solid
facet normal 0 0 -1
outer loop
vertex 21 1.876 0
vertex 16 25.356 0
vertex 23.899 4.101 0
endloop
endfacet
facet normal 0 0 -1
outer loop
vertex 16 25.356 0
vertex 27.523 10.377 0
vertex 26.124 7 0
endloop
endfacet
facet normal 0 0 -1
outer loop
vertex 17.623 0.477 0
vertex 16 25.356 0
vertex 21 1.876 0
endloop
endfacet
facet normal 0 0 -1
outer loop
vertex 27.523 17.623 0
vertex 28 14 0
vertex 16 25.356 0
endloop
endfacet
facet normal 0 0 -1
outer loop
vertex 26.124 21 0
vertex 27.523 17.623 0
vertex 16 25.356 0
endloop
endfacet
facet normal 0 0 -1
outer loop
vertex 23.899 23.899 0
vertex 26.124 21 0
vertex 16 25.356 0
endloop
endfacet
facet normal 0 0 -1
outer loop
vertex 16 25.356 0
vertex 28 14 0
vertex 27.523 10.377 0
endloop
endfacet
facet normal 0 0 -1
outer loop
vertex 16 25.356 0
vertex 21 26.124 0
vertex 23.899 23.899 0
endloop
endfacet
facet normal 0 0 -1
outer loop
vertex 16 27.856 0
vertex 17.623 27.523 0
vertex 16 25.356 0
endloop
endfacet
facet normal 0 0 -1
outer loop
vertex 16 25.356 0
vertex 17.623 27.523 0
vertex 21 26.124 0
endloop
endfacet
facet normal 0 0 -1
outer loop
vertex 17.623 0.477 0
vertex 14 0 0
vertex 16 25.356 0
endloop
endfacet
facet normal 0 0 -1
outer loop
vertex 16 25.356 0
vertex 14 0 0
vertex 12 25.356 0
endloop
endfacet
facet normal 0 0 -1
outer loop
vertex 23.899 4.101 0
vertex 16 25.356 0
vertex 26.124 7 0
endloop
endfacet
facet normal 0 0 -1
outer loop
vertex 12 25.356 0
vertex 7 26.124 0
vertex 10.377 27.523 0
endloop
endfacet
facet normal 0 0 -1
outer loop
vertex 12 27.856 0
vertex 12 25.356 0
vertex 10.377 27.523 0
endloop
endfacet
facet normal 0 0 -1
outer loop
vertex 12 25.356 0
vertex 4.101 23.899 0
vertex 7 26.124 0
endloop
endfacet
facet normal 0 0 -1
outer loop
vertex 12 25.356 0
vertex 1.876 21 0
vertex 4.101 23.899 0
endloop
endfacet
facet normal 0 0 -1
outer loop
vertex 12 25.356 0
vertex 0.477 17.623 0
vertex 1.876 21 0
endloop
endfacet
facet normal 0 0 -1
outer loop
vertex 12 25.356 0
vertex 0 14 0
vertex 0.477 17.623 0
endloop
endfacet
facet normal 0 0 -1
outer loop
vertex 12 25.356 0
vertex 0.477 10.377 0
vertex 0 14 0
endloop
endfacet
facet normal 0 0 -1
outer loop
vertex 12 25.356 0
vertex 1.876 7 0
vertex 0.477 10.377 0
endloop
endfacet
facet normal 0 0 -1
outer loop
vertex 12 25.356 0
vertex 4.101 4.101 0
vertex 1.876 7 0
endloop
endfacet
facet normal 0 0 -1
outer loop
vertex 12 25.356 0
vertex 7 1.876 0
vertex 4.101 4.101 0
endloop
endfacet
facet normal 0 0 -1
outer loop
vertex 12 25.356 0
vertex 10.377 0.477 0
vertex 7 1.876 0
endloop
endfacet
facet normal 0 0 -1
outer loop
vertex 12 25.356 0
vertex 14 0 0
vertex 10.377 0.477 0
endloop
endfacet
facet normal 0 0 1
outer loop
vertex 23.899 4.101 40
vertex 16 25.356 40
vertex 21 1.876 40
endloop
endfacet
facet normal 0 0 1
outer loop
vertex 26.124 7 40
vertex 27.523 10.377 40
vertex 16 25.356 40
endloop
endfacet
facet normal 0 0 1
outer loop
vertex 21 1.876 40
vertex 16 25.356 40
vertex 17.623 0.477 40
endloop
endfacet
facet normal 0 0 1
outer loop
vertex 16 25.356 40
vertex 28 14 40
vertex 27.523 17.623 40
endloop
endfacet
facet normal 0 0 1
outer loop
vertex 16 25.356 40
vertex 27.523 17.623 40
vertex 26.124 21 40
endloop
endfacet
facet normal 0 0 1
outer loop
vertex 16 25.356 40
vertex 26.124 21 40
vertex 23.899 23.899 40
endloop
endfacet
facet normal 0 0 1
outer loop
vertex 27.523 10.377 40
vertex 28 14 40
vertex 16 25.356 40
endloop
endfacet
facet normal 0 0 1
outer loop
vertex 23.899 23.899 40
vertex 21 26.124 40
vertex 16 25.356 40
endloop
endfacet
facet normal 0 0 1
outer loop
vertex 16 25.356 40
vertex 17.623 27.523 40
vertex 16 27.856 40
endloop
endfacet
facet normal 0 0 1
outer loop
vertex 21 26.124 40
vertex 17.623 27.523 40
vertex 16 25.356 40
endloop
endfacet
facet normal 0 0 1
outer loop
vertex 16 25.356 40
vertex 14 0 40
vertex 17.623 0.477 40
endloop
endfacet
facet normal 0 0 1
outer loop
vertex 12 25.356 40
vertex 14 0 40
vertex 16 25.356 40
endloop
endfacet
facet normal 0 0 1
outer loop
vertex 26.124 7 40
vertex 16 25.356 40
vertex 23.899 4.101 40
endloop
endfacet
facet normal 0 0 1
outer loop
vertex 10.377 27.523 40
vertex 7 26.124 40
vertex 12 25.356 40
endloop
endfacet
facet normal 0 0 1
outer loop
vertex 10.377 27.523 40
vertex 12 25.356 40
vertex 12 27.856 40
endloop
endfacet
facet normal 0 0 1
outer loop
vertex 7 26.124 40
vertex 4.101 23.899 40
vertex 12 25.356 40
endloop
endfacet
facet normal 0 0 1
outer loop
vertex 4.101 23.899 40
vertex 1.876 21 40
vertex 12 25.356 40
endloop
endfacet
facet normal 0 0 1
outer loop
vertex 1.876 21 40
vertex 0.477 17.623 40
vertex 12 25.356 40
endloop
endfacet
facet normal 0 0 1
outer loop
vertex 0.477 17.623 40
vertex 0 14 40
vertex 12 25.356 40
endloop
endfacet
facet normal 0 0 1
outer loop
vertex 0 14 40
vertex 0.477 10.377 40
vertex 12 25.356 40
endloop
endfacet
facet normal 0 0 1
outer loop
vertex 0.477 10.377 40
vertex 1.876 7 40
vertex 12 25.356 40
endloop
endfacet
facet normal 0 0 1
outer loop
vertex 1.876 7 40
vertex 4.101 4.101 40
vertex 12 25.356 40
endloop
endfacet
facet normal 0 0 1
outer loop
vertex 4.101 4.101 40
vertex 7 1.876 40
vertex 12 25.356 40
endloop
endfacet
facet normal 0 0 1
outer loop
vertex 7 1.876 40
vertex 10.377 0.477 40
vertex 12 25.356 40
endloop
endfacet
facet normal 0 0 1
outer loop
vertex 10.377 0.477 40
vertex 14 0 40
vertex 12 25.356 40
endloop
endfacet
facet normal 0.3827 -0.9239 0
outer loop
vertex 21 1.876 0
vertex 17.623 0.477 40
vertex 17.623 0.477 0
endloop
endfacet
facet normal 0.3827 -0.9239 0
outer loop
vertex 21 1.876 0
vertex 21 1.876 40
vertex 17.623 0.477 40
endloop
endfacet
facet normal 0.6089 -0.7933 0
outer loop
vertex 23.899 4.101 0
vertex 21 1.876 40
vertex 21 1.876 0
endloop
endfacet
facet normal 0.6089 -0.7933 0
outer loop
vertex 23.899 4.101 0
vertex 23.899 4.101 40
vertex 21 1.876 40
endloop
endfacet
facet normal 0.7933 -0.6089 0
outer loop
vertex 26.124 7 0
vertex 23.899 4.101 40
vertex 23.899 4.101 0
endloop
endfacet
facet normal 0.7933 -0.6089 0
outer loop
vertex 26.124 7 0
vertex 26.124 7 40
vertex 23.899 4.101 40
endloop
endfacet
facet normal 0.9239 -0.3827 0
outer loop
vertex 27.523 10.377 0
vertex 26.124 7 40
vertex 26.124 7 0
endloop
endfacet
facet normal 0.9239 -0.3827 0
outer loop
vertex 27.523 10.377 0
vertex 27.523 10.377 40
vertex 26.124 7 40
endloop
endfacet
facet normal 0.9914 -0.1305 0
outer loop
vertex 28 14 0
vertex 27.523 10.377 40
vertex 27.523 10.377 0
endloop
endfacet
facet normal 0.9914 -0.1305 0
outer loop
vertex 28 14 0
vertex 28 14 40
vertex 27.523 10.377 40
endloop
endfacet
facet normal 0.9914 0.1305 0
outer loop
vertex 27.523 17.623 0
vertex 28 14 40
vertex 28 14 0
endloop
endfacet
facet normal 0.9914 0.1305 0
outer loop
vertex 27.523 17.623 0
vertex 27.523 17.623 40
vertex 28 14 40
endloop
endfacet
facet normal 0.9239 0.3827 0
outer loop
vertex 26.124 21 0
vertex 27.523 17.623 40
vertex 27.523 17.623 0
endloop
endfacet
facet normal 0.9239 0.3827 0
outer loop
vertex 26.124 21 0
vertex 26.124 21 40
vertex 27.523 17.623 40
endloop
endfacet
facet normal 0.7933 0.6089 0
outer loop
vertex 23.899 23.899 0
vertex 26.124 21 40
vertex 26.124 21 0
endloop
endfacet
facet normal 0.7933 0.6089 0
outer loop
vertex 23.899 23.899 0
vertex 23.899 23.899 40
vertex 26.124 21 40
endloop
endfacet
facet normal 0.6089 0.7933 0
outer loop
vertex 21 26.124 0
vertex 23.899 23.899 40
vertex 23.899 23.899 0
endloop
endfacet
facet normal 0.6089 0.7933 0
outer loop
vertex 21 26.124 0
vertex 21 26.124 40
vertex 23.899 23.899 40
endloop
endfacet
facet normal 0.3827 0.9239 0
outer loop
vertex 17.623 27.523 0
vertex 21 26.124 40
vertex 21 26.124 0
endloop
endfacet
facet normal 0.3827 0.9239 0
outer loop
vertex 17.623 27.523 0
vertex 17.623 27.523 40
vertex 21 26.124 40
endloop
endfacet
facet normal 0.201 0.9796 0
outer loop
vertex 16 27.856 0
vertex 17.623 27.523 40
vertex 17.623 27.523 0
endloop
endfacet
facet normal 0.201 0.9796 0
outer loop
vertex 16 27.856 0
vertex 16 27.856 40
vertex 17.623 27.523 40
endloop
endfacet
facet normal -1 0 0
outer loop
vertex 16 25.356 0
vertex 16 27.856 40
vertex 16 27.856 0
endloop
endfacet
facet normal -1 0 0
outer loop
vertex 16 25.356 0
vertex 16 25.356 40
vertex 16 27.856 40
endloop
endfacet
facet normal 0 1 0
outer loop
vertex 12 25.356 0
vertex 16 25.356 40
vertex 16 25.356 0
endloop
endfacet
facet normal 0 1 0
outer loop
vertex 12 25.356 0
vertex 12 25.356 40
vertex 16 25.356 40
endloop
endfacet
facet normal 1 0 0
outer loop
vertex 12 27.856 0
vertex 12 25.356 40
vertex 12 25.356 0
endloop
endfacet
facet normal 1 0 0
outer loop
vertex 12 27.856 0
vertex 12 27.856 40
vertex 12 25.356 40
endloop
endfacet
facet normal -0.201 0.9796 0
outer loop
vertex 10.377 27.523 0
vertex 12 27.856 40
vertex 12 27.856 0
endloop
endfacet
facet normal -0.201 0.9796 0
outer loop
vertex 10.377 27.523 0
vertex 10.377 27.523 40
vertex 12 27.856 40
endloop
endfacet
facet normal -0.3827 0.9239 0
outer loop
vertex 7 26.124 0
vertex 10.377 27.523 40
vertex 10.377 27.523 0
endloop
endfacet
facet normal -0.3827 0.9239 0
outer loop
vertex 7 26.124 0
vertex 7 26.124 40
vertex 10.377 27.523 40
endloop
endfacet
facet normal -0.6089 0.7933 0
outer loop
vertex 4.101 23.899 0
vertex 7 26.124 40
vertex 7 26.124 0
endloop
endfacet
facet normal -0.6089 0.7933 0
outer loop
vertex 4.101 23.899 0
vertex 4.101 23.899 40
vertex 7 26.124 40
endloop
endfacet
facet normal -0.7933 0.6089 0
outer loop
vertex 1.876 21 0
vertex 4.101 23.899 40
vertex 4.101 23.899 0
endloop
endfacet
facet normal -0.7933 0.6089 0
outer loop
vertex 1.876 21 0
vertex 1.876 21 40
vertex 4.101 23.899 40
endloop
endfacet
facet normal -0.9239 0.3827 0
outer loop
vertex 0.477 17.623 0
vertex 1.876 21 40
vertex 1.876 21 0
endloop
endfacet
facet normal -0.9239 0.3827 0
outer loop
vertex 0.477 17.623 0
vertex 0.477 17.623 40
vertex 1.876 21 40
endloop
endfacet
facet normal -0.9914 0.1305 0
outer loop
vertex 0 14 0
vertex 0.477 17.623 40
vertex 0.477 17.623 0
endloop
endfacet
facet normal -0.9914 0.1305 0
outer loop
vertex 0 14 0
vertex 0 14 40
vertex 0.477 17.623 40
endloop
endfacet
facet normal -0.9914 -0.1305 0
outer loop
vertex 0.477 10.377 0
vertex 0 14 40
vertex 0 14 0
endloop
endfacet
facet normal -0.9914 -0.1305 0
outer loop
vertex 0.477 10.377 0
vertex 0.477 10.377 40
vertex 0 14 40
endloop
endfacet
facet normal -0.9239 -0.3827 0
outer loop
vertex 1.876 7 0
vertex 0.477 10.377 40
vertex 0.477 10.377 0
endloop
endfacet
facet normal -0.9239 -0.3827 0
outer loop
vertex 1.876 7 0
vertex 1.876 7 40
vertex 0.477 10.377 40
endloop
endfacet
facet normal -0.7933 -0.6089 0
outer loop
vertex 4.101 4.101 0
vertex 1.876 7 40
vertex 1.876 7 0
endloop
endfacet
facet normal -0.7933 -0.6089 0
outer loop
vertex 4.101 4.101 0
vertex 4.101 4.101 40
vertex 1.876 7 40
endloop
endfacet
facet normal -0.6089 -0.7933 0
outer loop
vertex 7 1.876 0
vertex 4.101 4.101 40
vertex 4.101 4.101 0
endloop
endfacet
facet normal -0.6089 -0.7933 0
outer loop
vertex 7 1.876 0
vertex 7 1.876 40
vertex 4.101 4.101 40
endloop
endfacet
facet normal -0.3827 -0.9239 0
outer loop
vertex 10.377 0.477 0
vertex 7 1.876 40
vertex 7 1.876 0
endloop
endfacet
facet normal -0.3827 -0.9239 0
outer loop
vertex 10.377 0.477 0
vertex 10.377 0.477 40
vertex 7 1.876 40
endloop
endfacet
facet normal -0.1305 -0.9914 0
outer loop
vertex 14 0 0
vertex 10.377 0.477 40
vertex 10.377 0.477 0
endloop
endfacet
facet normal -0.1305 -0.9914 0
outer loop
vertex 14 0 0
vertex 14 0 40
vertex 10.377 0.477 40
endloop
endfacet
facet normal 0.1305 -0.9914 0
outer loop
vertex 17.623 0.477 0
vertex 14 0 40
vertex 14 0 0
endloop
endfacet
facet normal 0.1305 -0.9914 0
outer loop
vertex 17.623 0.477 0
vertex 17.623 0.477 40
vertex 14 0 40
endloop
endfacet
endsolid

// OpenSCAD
$fn = 32;

// ----------------------------------------------------------------------
// Keyway shaft: d28 shaft, key 4 x 2.5 mm
// ----------------------------------------------------------------------

// --- parameters (mm) ---
shaft_r = 14;             // shaft radius
key_w = 4;                // keyway width
key_d = 2.5;              // keyway depth below the surface line
plate_t = 40;             // shaft length, Z (extrusion height)

shaft_d = 2 * shaft_r;  // shaft diameter
circle_step = 15;  // polygon sampling step, degrees

profile = [[10.377, 27.523], [7, 26.124], [4.101, 23.899], [1.876, 21], [0.477, 17.623], [0, 14], [0.477, 10.377], [1.876, 7], [4.101, 4.101], [7, 1.876], [10.377, 0.477], [14, 0], [17.623, 0.477], [21, 1.876], [23.899, 4.101], [26.124, 7], [27.523, 10.377], [28, 14], [27.523, 17.623], [26.124, 21], [23.899, 23.899], [21, 26.124], [17.623, 27.523], [16, 27.856], [16, 25.356], [12, 25.356], [12, 27.856]];  // primary outline, 27 points, counter clockwise

// --- the one profile operation ---
linear_extrude(height = plate_t) polygon(points = profile);
